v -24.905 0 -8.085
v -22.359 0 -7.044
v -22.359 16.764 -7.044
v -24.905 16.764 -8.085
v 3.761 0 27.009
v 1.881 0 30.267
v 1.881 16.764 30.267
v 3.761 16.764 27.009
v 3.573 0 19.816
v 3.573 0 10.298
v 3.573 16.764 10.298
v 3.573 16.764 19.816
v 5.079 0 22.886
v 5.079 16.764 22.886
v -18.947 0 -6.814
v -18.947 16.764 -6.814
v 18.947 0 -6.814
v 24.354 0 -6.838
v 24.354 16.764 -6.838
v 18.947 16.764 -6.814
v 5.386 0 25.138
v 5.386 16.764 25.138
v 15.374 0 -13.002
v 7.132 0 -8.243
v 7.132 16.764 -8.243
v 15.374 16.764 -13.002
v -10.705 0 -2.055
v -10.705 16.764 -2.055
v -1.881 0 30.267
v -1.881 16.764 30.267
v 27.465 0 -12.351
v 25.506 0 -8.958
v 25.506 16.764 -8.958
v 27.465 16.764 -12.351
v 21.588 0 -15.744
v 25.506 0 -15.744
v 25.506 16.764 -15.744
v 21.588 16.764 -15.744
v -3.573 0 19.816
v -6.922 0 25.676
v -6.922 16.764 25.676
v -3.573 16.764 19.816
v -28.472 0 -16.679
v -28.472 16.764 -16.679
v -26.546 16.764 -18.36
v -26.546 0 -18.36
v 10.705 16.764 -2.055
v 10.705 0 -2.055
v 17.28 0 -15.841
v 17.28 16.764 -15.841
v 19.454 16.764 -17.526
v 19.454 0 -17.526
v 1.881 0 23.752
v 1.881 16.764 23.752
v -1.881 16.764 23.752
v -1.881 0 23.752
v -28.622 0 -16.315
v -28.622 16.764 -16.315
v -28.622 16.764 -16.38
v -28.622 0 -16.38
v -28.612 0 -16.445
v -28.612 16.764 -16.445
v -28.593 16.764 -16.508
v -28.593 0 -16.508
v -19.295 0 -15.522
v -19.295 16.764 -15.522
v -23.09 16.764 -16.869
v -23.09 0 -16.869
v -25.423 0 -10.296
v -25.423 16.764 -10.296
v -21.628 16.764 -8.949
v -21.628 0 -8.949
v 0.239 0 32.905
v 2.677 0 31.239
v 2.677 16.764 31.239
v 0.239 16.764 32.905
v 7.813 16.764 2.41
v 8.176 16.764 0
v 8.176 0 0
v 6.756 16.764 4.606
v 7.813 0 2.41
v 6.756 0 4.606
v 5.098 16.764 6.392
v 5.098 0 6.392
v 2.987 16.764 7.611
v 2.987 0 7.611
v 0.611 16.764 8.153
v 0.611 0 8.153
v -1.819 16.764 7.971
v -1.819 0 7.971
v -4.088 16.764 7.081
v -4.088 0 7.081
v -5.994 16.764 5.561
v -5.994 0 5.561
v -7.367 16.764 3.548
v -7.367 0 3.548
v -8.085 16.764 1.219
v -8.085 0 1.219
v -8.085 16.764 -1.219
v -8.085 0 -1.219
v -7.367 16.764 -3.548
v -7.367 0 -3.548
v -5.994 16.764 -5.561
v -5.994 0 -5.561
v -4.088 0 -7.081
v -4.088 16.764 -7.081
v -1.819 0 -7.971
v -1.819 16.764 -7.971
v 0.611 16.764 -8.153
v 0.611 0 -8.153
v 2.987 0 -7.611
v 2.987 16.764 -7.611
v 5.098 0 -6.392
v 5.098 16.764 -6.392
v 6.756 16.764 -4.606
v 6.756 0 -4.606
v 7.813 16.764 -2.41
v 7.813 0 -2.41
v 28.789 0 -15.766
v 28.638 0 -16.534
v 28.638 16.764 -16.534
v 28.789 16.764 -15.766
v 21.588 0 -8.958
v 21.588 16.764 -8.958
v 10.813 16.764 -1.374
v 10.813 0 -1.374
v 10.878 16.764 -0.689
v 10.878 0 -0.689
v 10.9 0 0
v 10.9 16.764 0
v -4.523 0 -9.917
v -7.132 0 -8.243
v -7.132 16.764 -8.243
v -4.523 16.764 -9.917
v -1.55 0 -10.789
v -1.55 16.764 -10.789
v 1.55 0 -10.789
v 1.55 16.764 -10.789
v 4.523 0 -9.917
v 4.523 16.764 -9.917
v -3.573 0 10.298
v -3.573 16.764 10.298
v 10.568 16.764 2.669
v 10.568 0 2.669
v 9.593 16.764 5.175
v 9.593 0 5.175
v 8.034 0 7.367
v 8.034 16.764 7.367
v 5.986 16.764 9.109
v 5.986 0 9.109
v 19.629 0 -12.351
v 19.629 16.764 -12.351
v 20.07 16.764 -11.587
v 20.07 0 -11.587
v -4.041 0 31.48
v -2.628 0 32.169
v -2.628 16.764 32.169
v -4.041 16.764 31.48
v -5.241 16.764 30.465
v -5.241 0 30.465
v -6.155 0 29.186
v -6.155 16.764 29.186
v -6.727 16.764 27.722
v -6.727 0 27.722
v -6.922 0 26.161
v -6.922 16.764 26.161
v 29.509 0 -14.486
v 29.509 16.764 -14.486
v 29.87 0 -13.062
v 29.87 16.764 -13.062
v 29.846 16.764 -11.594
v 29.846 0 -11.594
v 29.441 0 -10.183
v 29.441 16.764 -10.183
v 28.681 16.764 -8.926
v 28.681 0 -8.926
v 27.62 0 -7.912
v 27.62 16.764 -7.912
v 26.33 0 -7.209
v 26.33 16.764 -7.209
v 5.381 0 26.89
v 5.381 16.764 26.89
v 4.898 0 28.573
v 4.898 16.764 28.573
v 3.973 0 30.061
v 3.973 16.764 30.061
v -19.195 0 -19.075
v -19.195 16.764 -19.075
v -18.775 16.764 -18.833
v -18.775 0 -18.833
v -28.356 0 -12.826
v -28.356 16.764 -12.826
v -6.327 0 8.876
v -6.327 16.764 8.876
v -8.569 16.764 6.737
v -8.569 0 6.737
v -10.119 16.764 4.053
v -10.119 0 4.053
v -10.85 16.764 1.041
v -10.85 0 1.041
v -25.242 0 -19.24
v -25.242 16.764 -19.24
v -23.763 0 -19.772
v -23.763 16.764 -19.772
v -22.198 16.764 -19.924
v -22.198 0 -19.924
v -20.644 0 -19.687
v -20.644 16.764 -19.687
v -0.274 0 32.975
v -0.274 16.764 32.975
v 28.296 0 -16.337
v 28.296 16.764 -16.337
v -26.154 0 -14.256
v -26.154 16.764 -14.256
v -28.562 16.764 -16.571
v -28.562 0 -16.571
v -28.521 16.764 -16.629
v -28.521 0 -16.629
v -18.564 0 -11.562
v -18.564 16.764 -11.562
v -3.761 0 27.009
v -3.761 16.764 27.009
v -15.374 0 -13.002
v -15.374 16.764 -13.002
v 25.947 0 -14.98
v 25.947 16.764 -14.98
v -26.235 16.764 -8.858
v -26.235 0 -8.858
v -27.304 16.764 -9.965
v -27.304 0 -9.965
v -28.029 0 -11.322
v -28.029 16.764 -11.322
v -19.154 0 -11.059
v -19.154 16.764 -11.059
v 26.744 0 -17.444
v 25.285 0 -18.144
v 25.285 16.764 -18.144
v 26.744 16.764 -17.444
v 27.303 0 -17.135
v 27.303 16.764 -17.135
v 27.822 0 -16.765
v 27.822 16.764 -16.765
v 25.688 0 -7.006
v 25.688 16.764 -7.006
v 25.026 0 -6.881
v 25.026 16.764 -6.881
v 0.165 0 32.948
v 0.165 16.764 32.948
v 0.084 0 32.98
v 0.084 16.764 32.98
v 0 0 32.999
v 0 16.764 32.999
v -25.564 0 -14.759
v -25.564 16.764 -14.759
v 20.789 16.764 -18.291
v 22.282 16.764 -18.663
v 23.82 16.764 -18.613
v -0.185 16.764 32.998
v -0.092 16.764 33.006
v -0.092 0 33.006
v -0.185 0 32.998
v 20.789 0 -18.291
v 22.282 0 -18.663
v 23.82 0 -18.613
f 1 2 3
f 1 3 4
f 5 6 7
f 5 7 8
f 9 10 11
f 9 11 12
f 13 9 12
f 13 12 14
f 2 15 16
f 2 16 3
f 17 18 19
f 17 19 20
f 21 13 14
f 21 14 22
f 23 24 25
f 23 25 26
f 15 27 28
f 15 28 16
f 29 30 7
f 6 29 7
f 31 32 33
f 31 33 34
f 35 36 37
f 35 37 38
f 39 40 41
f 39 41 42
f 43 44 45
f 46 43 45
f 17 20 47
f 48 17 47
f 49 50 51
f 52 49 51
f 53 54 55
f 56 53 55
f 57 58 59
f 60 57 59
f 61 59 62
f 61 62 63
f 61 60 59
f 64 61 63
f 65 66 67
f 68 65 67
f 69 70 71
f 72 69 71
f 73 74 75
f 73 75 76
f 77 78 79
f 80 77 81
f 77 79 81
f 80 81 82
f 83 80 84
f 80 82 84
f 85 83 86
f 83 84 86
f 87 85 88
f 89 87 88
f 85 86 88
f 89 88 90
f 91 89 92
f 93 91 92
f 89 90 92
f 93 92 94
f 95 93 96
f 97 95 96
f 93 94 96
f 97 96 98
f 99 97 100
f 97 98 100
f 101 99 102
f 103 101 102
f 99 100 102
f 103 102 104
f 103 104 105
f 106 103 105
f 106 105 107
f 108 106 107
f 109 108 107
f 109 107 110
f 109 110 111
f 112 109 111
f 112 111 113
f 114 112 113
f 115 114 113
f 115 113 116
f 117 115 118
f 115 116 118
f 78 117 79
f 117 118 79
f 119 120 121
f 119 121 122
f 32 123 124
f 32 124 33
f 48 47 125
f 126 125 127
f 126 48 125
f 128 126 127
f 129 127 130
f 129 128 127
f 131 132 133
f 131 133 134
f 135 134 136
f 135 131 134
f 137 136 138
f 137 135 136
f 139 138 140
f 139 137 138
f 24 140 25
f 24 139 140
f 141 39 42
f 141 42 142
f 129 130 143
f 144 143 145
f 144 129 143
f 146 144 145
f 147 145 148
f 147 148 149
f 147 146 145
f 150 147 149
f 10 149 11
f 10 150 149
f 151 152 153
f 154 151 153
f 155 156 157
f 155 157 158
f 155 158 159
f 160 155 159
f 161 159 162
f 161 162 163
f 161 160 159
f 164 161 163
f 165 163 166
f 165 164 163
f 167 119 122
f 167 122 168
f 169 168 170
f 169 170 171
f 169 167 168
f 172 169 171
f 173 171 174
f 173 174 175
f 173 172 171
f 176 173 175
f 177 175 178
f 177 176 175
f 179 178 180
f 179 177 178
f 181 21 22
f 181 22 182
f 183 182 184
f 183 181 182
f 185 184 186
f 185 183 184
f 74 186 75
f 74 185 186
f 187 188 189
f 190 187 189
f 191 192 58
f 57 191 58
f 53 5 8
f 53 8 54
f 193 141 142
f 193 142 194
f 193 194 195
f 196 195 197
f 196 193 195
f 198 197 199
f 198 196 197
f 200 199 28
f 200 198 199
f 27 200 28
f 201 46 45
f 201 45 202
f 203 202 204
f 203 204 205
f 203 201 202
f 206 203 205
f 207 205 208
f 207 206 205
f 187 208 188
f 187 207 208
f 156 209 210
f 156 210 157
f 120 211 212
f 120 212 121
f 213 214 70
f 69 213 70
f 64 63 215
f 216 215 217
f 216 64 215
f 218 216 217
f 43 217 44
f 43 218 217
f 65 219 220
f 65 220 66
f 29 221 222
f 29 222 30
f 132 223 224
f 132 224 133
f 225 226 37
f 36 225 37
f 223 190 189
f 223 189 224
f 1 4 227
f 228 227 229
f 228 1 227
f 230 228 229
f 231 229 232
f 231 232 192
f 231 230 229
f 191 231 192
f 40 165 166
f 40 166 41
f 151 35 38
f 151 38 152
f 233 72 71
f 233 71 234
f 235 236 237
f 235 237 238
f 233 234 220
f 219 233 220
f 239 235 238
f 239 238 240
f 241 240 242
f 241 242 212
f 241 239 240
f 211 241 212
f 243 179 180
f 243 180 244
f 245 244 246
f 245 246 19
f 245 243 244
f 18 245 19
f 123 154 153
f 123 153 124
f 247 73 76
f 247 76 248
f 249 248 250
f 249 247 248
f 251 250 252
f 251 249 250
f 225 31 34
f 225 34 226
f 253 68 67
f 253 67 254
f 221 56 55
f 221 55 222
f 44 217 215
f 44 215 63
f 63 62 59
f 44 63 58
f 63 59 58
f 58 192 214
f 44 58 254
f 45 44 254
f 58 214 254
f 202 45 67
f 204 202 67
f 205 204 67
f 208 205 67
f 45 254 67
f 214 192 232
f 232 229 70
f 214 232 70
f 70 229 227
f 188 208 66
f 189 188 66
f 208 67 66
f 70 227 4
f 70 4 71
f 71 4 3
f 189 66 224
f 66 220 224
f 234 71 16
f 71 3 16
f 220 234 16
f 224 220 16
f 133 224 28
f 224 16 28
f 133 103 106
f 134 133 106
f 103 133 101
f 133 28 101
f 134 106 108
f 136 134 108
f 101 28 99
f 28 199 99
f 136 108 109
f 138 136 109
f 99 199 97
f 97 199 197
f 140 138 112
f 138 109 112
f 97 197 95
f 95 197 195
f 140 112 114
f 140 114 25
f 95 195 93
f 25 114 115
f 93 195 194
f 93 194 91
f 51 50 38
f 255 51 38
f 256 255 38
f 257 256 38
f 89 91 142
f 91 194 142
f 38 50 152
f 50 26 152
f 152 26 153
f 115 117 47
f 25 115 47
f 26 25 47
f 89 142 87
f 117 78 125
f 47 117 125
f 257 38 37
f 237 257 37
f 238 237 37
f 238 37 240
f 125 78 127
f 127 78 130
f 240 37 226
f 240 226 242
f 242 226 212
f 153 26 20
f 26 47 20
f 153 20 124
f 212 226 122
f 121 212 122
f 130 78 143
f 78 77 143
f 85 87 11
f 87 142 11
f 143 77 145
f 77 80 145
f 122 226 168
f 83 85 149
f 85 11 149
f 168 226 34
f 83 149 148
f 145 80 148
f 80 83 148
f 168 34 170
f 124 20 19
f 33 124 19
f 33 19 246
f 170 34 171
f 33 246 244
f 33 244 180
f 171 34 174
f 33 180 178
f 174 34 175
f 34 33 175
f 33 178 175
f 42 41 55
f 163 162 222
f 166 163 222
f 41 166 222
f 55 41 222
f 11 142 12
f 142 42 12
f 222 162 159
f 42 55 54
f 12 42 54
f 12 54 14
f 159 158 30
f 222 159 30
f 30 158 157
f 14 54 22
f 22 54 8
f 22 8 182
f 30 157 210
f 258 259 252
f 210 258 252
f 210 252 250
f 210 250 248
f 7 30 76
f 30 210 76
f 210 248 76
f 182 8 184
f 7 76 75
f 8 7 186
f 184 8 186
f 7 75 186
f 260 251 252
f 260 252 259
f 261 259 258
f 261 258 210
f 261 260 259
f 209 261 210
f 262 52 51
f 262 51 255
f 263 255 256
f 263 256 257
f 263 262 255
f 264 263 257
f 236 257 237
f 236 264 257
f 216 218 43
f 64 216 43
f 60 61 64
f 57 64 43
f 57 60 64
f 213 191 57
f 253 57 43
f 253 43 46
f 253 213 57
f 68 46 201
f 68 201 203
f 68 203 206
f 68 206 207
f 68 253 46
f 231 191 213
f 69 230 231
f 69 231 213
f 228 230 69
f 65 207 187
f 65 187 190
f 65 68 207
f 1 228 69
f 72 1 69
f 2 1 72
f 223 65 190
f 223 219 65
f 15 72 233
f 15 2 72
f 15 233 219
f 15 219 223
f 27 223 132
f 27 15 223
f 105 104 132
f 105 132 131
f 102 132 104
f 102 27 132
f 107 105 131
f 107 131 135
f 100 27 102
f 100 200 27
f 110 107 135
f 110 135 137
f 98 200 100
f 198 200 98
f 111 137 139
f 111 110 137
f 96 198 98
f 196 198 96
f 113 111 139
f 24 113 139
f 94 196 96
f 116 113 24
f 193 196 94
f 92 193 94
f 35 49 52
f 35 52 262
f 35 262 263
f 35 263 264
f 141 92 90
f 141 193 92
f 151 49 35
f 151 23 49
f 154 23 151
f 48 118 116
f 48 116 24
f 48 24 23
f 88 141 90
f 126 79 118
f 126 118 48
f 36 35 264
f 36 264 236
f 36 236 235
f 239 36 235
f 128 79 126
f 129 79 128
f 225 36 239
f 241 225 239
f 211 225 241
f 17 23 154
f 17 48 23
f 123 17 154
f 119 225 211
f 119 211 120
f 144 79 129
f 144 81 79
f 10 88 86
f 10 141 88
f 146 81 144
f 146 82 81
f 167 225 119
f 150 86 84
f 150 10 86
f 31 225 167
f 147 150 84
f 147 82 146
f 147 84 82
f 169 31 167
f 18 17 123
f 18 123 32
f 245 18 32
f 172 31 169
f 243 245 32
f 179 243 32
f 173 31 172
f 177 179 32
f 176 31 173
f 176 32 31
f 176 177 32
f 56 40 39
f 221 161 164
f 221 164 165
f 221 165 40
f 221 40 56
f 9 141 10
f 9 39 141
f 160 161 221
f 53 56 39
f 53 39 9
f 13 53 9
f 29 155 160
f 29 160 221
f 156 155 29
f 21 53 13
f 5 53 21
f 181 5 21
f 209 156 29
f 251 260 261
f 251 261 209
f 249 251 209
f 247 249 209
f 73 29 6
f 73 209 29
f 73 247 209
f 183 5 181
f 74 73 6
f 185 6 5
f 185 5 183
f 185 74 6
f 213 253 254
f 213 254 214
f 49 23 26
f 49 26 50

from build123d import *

# Parameters (mm, degrees)
F0_R     = 8.1762348774
F1_DEPTH = 16.764


with BuildPart() as f1:
    # F0 (on Front) → F1 (new body)
    with BuildSketch(Plane.XZ):
        with BuildLine():
            ThreePointArc((10.7045995524, -2.0546407042), (10.8510399299, -1.0319556383), (10.9, 0))
            ThreePointArc((10.9, 0), (8.8812984176, 6.3192197633), (3.5729287307, 10.2977755018))
            ThreePointArc((3.5729287307, 10.2977755018), (0, 10.9), (-3.5729287307, 10.2977755018))
            ThreePointArc((-3.5729287307, 10.2977755018), (-9.4396769013, 5.45), (-10.7045995524, -2.0546407042))
            ThreePointArc((-10.7045995524, -2.0546407042), (-9.4396769013, -5.45), (-7.1316708216, -8.2431347976))
            ThreePointArc((-7.1316708216, -8.2431347976), (0, -10.9), (7.1316708216, -8.2431347976))
            ThreePointArc((7.1316708216, -8.2431347976), (9.4396769013, -5.45), (10.7045995524, -2.0546407042))
        make_face()
        Circle(F0_R, mode=Mode.SUBTRACT)
        with BuildLine():
            ThreePointArc((-3.5729287307, 10.2977755018), (0, 10.9), (3.5729287307, 10.2977755018))
            Line((3.5729287307, 10.2977755018), (3.5729287307, 19.8155592292))
            Line((3.5729287307, 19.8155592292), (5.078934896, 22.8855756019))
            Line((5.078934896, 22.8855756019), (5.3861358478, 25.1383827151))
            ThreePointArc((5.3861358478, 25.1383827151), (4.8979120469, 28.5734299473), (2.6770923706, 31.239114087))
            Line((2.6770923706, 31.239114087), (0.2394953625, 32.9048861241))
            ThreePointArc((0.2394953625, 32.9048861241), (0.1250583953, 32.9655378852), (0, 32.9992254696))
            ThreePointArc((0, 32.9992254696), (-0.1387115468, 33.0035052248), (-0.2744548515, 32.9746440958))
            Line((-0.2744548515, 32.9746440958), (-2.6277035917, 32.1694766202))
            ThreePointArc((-2.6277035917, 32.1694766202), (-5.7380801108, 29.853914456), (-6.9220383964, 26.1614203118))
            Line((-6.9220383964, 26.1614203118), (-6.9220383964, 25.6764997761))
            Line((-6.9220383964, 25.6764997761), (-3.5729287307, 19.8155592292))
            Line((-3.5729287307, 19.8155592292), (-3.5729287307, 10.2977755018))
        make_face()
        Polygon((-1.8806647364, 30.2667208016), (0, 30.2667208016), (1.8806647364, 30.2667208016), (3.7613294728, 27.0093139261), (1.8806647364, 23.7519070506), (0, 23.7519070506), (-1.8806647364, 23.7519070506), (-3.7613294728, 27.0093139261), align=None, mode=Mode.SUBTRACT)
        with BuildLine():
            Line((18.947242048, -6.8135325679), (10.7045995524, -2.0546407042))
            ThreePointArc((10.7045995524, -2.0546407042), (9.4396769013, -5.45), (7.1316708216, -8.2431347976))
            Line((7.1316708216, -8.2431347976), (15.3743133173, -13.0020266613))
            Line((15.3743133173, -13.0020266613), (17.2800224035, -15.8412744451))
            Line((17.2800224035, -15.8412744451), (19.4543915529, -17.5257716809))
            ThreePointArc((19.4543915529, -17.5257716809), (22.2820714904, -18.6631064405), (25.2854497533, -18.1444319823))
            Line((25.2854497533, -18.1444319823), (26.7438602666, -17.4440315112))
            ThreePointArc((26.7438602666, -17.4440315112), (27.5677621083, -16.9572968799), (28.2963483866, -16.3369043581))
            ThreePointArc((28.2963483866, -16.3369043581), (28.5524118785, -16.0596668899), (28.7891431297, -15.7657494859))
            Line((28.7891431297, -15.7657494859), (29.2797580155, -13.2677285991))
            ThreePointArc((29.2797580155, -13.2677285991), (28.8843269769, -9.8844337919), (26.595254614, -7.3618959476))
            Line((26.595254614, -7.3618959476), (26.3302729622, -7.2089087196))
            ThreePointArc((26.3302729622, -7.2089087196), (25.3589284831, -6.933455194), (24.3538425846, -6.8376059446))
            Line((24.3538425846, -6.8376059446), (18.947242048, -6.8135325679))
        make_face()
        Polygon((25.9469195413, -14.9804609818), (25.5060197939, -15.7441217452), (21.5879713963, -15.7441217452), (19.6289471975, -12.3509922996), (20.0698469448, -11.5873315362), (21.5879713963, -8.957862854), (25.5060197939, -8.957862854), (27.4650439927, -12.3509922996), align=None, mode=Mode.SUBTRACT)
        with BuildLine():
            ThreePointArc((-7.1316708216, -8.2431347976), (-9.4396769013, -5.45), (-10.7045995524, -2.0546407042))
            Line((-10.7045995524, -2.0546407042), (-18.947242048, -6.8135325679))
            Line((-18.947242048, -6.8135325679), (-22.3589572995, -7.0443011568))
            Line((-22.3589572995, -7.0443011568), (-24.904959273, -8.0851114596))
            ThreePointArc((-24.904959273, -8.0851114596), (-27.3037600362, -9.9652867393), (-28.3562639105, -12.8256258414))
            Line((-28.3562639105, -12.8256258414), (-28.621501234, -16.3145697088))
            ThreePointArc((-28.621501234, -16.3145697088), (-28.6179368344, -16.4128846333), (-28.5926007189, -16.5079457219))
            ThreePointArc((-28.5926007189, -16.5079457219), (-28.5427339525, -16.6008192319), (-28.4721935743, -16.6791533769))
            Line((-28.4721935743, -16.6791533769), (-26.5457321837, -18.3603963741))
            ThreePointArc((-26.5457321837, -18.3603963741), (-22.9852082659, -19.8962803729), (-19.1954353909, -19.0753712531))
            Line((-19.1954353909, -19.0753712531), (-18.7754818882, -18.8329109853))
            Line((-18.7754818882, -18.8329109853), (-15.3743133173, -13.0020266613))
            Line((-15.3743133173, -13.0020266613), (-7.1316708216, -8.2431347976))
        make_face()
        Polygon((-19.1541526712, -11.0586552008), (-18.5637420285, -11.5622606176), (-19.2950824343, -15.5223581541), (-23.0902977052, -16.8690475522), (-25.5637619278, -14.7592448305), (-26.1541725704, -14.2556394138), (-25.4228321647, -10.2955418772), (-21.6276168938, -8.9488524791), align=None, mode=Mode.SUBTRACT)
        with BuildLine():
            ThreePointArc((28.7891431297, -15.7657494859), (29.6901919838, -10.8751191131), (26.3302729622, -7.2089087196))
            Line((26.3302729622, -7.2089087196), (26.595254614, -7.3618959476))
            ThreePointArc((26.595254614, -7.3618959476), (28.8843269769, -9.8844337919), (29.2797580155, -13.2677285991))
            Line((29.2797580155, -13.2677285991), (28.7891431297, -15.7657494859))
        make_face()
        with BuildLine():
            Line((28.6382036926, -16.534274611), (28.7891431297, -15.7657494859))
            ThreePointArc((28.7891431297, -15.7657494859), (28.5524118785, -16.0596668899), (28.2963483866, -16.3369043581))
            Line((28.2963483866, -16.3369043581), (28.6382036926, -16.534274611))
        make_face()
    extrude(amount=-F1_DEPTH)


solid = f1.part
